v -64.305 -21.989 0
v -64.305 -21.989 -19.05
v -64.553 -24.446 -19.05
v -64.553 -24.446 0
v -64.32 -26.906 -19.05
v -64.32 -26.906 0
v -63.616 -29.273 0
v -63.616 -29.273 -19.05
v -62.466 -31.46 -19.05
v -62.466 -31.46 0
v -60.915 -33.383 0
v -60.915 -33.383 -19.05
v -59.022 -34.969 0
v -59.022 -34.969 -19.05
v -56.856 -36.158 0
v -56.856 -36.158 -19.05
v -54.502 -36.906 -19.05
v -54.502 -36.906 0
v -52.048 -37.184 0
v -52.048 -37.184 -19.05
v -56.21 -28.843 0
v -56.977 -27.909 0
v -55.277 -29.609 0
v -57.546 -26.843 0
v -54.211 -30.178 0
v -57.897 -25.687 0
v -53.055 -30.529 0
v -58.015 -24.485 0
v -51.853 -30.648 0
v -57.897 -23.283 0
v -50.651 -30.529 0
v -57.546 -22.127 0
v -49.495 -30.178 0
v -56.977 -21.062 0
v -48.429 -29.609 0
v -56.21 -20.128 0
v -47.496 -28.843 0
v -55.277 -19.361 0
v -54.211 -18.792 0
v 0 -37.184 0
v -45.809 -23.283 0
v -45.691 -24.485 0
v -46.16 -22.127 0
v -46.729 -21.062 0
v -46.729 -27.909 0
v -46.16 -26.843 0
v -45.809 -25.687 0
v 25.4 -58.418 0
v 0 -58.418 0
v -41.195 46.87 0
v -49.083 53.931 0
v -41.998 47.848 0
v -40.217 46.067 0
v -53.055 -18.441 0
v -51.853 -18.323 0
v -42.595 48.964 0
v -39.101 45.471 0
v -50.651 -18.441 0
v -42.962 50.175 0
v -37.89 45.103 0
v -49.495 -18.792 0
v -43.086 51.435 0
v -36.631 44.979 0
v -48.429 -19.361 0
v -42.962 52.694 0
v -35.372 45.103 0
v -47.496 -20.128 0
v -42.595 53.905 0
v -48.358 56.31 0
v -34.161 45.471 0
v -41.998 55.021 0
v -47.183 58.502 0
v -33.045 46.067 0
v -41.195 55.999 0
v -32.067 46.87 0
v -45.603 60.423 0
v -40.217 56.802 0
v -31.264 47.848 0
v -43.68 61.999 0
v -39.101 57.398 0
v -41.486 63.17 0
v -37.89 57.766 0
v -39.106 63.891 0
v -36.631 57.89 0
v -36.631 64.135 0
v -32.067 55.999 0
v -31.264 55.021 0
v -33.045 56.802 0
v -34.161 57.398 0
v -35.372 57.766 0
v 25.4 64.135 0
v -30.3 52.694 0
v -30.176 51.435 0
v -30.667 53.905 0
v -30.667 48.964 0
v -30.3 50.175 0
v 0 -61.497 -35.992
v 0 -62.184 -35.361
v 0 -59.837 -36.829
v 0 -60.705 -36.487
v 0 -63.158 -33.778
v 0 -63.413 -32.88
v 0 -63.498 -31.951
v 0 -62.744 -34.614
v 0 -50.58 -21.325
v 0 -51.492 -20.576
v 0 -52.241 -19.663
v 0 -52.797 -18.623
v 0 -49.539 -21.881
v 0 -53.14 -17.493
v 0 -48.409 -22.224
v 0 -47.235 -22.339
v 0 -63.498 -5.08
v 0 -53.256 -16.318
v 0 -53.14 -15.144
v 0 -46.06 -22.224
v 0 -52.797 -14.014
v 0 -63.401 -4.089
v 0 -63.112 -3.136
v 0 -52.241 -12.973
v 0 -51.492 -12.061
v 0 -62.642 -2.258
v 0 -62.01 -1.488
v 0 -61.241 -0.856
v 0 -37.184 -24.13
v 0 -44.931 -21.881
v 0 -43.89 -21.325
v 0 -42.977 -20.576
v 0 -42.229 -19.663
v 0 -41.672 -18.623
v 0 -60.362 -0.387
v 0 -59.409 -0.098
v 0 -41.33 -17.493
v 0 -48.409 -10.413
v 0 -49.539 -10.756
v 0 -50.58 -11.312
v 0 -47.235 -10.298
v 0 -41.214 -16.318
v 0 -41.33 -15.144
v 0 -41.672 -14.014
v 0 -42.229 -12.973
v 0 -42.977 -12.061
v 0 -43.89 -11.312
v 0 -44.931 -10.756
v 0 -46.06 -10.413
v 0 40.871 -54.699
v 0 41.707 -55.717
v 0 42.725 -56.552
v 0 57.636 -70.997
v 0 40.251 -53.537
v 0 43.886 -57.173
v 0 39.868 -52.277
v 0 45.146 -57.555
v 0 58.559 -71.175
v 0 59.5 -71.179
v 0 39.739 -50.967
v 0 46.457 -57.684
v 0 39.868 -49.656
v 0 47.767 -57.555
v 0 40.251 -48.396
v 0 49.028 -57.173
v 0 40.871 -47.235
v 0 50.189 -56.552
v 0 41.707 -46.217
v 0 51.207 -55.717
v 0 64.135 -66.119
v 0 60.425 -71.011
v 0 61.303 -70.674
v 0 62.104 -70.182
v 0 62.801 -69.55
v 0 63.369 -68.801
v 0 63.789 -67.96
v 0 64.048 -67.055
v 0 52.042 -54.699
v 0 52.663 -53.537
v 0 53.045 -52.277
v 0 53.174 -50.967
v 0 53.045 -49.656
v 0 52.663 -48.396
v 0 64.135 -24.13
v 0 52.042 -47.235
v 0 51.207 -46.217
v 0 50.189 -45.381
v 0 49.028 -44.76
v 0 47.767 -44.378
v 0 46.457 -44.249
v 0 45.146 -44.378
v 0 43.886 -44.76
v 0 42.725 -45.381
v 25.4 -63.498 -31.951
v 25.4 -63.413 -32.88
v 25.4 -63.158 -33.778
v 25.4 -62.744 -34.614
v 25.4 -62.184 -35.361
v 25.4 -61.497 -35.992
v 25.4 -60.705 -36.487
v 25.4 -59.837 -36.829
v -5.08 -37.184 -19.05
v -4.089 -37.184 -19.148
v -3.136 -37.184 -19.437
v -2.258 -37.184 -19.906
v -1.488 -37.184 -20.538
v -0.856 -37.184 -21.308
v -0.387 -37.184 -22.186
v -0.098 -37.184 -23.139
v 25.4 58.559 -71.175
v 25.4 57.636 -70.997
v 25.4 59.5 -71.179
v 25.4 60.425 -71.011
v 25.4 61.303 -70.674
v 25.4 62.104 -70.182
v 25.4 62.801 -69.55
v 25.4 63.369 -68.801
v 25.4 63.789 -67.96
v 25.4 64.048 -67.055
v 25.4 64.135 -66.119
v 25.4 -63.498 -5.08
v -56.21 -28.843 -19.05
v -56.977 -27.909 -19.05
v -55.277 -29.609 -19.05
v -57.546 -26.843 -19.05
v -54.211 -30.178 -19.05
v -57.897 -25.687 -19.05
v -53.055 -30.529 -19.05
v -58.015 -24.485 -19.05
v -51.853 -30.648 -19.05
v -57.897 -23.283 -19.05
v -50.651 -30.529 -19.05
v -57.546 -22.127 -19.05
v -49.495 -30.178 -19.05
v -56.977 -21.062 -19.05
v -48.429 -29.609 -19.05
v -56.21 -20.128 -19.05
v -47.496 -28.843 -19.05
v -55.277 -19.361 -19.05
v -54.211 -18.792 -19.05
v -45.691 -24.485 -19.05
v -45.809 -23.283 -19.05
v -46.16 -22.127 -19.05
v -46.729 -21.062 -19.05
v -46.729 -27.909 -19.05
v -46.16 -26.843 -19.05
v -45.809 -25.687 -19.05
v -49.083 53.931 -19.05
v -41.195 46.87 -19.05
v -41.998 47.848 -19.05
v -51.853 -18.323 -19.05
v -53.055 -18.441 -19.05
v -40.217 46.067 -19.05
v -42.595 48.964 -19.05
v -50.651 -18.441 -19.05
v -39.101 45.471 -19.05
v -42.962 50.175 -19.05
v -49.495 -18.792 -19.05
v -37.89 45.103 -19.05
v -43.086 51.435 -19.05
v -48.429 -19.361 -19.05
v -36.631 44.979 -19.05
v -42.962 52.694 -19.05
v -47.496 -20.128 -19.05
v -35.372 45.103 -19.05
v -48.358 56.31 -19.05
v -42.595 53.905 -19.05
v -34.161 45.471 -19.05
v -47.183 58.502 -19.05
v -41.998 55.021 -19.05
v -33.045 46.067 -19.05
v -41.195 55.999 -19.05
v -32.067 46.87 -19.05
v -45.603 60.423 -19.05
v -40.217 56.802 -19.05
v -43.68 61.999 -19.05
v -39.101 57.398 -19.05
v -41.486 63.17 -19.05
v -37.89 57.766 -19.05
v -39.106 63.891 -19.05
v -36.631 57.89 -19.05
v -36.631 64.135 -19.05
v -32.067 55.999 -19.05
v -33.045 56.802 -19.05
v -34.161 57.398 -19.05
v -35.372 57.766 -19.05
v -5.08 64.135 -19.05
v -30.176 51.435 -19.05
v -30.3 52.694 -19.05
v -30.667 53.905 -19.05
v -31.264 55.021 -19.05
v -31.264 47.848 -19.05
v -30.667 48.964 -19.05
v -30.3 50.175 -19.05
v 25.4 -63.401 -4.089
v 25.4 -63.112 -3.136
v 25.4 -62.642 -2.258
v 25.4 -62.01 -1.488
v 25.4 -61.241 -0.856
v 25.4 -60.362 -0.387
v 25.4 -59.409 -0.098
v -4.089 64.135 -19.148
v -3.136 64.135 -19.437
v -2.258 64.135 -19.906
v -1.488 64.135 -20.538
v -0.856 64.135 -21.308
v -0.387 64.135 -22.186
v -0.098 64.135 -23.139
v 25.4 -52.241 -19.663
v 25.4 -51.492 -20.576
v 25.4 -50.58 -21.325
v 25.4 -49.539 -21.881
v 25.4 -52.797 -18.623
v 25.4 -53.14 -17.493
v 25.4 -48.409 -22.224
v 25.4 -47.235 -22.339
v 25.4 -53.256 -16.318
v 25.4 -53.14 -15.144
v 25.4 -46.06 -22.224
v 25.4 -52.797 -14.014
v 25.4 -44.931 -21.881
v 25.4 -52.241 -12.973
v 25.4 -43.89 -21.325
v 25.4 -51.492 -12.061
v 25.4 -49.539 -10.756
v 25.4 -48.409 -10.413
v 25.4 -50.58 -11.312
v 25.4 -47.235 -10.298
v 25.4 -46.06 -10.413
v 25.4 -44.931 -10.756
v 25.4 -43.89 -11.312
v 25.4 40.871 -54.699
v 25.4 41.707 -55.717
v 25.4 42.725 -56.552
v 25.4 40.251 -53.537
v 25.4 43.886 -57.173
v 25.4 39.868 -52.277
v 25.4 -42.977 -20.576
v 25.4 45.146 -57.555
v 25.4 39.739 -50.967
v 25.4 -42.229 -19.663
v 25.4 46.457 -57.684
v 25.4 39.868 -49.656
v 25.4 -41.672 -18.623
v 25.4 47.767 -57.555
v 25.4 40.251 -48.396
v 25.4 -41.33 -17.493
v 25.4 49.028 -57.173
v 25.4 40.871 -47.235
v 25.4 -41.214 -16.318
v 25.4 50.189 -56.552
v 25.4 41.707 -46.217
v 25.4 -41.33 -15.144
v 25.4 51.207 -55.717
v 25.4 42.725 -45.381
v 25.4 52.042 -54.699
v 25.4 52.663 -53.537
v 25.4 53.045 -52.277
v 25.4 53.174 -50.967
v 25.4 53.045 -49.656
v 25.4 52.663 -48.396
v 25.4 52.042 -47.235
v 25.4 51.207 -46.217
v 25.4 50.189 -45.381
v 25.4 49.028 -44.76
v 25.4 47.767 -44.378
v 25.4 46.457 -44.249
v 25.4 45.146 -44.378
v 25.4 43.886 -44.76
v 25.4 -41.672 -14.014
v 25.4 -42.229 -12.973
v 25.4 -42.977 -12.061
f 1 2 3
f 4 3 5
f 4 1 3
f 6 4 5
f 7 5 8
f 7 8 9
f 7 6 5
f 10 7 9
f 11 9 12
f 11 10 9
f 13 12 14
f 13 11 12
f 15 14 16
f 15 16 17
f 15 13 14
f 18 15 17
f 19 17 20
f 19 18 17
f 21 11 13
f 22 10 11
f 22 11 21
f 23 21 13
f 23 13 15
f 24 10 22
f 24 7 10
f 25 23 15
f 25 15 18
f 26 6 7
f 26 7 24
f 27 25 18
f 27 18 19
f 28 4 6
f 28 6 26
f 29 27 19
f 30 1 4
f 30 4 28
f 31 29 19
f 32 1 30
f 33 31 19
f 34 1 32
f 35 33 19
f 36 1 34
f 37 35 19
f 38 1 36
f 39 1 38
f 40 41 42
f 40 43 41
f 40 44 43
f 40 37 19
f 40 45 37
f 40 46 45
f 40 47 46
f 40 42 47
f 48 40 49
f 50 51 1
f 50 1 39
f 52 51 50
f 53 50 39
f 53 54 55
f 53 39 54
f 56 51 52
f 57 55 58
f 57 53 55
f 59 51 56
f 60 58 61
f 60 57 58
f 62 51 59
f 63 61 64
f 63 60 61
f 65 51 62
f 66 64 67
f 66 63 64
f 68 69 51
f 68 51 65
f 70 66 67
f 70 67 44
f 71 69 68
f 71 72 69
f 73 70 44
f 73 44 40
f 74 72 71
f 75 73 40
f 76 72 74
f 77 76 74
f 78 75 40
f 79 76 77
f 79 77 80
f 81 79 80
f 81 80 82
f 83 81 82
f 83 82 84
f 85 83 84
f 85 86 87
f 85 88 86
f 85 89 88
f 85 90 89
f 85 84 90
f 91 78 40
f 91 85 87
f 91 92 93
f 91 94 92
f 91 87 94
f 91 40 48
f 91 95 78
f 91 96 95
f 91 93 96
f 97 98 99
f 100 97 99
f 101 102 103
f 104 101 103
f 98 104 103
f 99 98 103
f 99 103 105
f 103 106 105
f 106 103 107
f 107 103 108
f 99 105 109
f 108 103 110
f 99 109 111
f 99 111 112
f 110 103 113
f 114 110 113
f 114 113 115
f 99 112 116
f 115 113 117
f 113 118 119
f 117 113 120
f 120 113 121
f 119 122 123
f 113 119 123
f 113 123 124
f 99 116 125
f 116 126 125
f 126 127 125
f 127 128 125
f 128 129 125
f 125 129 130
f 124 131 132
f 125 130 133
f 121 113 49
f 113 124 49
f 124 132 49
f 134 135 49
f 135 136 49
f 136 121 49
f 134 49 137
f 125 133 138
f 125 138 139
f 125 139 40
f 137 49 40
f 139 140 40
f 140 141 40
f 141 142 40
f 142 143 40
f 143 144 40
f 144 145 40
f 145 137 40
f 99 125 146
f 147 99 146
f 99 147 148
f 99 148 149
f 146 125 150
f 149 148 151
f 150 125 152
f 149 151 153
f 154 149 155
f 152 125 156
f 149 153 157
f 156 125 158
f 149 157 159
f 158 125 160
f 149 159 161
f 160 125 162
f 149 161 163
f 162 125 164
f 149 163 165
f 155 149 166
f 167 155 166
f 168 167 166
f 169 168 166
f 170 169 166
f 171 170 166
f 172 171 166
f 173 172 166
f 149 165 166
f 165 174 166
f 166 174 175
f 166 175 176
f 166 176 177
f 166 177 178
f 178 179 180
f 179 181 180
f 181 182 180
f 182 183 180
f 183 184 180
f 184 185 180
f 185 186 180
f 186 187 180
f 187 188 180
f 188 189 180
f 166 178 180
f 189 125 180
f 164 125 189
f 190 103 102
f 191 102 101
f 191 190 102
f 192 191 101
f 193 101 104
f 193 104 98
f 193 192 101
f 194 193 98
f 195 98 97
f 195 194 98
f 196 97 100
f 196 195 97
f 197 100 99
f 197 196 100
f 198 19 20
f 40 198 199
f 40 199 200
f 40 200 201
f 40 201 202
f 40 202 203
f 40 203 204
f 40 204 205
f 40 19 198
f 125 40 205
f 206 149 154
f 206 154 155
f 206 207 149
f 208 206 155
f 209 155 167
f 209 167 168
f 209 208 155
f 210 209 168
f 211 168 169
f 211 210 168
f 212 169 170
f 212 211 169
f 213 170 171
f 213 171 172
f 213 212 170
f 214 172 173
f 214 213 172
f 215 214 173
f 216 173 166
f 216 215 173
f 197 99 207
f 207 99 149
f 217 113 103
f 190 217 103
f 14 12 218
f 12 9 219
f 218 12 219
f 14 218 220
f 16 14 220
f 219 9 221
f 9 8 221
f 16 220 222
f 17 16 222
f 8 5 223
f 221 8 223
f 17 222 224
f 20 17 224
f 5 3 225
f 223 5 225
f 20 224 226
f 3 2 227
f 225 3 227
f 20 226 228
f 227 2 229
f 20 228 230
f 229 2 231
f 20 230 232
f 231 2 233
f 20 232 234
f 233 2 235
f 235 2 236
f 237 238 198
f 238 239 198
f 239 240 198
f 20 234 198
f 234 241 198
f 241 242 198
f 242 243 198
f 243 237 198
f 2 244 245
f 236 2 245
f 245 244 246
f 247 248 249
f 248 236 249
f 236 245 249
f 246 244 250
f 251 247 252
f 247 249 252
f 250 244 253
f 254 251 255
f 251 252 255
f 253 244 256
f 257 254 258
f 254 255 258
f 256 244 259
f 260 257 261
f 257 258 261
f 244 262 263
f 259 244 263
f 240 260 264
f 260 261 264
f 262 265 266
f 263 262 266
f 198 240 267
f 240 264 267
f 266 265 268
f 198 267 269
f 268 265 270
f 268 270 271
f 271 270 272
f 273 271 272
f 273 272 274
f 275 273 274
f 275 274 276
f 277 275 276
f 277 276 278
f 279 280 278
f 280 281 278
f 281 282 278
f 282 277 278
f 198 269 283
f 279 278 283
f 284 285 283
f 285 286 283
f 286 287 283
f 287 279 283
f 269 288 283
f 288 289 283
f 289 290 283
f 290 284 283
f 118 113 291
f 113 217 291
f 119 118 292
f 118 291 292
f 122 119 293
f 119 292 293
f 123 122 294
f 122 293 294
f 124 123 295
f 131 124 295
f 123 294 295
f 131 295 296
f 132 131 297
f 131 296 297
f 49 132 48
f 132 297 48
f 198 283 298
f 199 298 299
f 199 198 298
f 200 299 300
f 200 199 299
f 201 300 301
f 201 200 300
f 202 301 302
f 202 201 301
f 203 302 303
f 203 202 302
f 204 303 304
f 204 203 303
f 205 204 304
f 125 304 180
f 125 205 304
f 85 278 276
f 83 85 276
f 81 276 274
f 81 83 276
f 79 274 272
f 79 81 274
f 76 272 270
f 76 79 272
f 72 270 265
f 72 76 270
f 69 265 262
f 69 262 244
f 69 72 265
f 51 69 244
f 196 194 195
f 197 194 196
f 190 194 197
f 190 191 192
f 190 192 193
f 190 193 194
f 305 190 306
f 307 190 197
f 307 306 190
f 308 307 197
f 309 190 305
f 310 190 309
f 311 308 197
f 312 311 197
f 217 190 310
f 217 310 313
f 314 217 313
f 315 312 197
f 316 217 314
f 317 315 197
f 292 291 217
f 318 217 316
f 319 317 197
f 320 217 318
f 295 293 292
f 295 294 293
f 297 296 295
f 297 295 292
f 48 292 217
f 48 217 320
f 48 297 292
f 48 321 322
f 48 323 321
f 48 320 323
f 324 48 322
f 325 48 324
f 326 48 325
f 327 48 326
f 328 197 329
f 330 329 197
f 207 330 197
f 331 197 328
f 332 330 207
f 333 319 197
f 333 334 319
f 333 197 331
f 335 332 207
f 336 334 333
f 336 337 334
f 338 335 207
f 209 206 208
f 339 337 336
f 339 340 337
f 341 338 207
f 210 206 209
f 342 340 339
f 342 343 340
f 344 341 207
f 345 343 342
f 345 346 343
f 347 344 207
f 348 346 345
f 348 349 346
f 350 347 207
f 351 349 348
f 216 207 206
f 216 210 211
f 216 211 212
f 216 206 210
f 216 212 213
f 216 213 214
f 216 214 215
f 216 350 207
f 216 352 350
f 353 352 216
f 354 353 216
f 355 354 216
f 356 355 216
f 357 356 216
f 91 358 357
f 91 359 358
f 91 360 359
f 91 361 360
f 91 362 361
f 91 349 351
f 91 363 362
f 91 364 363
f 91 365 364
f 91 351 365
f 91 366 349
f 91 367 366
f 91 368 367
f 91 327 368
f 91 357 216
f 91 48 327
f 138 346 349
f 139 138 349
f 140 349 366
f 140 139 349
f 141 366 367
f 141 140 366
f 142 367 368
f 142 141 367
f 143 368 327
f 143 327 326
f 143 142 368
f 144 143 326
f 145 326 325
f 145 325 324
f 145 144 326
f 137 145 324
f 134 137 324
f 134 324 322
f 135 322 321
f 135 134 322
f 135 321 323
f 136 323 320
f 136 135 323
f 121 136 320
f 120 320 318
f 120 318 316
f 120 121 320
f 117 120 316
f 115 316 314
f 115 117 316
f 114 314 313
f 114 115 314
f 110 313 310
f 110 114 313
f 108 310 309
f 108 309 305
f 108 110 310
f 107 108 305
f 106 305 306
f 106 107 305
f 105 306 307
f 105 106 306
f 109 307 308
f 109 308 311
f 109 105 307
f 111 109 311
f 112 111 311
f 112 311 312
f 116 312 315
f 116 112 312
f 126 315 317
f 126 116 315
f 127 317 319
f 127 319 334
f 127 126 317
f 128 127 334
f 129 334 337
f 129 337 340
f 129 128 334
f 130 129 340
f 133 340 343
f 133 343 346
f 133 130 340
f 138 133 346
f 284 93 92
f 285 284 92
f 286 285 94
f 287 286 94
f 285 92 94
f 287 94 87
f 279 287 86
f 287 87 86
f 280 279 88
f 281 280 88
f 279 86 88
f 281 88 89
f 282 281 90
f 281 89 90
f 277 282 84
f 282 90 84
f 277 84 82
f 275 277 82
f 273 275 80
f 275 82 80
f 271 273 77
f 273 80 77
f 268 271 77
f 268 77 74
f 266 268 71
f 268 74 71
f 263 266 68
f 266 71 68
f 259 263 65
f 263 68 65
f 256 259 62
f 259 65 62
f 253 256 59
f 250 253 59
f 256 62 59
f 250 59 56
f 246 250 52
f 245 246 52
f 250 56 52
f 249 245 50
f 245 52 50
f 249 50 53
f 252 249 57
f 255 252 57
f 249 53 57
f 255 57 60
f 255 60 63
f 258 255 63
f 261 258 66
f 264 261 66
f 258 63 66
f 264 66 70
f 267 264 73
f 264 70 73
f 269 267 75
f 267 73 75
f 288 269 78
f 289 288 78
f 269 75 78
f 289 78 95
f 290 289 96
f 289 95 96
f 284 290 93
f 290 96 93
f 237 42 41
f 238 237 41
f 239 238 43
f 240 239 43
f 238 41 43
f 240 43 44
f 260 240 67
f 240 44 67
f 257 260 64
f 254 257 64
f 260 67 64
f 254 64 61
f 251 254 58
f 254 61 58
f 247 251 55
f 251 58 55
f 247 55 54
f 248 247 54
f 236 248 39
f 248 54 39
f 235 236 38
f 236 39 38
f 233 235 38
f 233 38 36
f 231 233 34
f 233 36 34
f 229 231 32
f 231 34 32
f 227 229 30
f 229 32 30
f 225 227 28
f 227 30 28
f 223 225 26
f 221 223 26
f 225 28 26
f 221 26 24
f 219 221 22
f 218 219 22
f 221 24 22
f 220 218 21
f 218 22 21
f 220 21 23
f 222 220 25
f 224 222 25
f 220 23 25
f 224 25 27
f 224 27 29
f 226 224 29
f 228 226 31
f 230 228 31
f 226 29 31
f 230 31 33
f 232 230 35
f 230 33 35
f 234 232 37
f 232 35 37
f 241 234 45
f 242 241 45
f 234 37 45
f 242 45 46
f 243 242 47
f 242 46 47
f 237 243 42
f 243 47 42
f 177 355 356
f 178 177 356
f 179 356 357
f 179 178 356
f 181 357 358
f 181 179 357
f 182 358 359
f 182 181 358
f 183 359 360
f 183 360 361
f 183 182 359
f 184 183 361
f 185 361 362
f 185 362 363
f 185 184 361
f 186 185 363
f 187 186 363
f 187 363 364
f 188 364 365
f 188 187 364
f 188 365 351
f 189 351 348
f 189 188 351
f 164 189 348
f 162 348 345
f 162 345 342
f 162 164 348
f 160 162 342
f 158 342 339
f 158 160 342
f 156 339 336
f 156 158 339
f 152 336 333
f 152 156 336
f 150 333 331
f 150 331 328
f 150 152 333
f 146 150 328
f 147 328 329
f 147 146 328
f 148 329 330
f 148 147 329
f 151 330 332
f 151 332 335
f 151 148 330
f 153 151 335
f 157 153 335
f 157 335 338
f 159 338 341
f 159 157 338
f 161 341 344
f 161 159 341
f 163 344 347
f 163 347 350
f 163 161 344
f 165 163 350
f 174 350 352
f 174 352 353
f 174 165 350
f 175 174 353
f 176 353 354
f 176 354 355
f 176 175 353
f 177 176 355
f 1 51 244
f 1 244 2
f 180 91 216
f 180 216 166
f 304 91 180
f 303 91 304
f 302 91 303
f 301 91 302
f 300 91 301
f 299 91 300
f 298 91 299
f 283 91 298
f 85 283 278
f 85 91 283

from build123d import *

# Parameters (mm, degrees)
F0_R     = 6.717517972
F0_R_2   = 6.020799142
F0_W     = 93.3380946517
F0_H     = 25.1572784036
F1_DEPTH = 25.4
F2_R     = 6.1623070593
F2_R_2   = 6.4550817185
F3_DEPTH = 19.05
F4_R     = 5.08


with BuildPart() as f1:
    # F0 (on Right) → F1 (new body)
    with BuildSketch(Plane.YZ):
        Polygon((-29.2035490274, 0), (-63.4982287884, 0), (-63.4982287884, -35.7638783753), (64.1345456243, -72.88698107), (64.1345456243, -25.1572784036), (-29.2035490274, -25.1572784036), align=None)
        with Locations((46.4568771422, -50.9666763246)):
            Circle(F0_R, mode=Mode.SUBTRACT)
        with Locations((-47.2347699106, -16.3184423)):
            Circle(F0_R_2, mode=Mode.SUBTRACT)
        with Locations((17.4654982984, -12.5786392018)):
            Rectangle(F0_W, F0_H)
    extrude(amount=F1_DEPTH)

    # F2 (on Top) → F3 (join)
    with BuildSketch(Plane.XY):
        with BuildLine():
            Line((-49.083184828, 53.9312161083), (-64.3051586518, -21.9885608041))
            ThreePointArc((-64.3051586518, -21.9885608041), (-61.737725203, -32.4590575274), (-52.0475044965, -37.1837415174))
            Line((-52.0475044965, -37.1837415174), (25.4, -37.1837415174))
            Line((25.4, -37.1837415174), (25.4, 64.1345456243))
            Line((25.4, 64.1345456243), (-36.6310108614, 64.1345456243))
            ThreePointArc((-36.6310108614, 64.1345456243), (-44.6803053911, 61.2579288283), (-49.083184828, 53.9312161083))
        make_face()
        with Locations((-51.8529846852, -24.4852312881)):
            Circle(F2_R, mode=Mode.SUBTRACT)
        with Locations((-36.6310108614, 51.4345456243)):
            Circle(F2_R_2, mode=Mode.SUBTRACT)
    extrude(amount=-F3_DEPTH)

    # F4
    f4_edges = [f1.edges().sort_by_distance(p)[0] for p in [
        (12.7, 64.134546, -72.886981),
        (12.7, -63.498229, -35.763878),
        (12.7, -63.498229, 0),
        (0, 13.475402, -19.05),
    ]]
    fillet(f4_edges, radius=F4_R)


solid = f1.part
